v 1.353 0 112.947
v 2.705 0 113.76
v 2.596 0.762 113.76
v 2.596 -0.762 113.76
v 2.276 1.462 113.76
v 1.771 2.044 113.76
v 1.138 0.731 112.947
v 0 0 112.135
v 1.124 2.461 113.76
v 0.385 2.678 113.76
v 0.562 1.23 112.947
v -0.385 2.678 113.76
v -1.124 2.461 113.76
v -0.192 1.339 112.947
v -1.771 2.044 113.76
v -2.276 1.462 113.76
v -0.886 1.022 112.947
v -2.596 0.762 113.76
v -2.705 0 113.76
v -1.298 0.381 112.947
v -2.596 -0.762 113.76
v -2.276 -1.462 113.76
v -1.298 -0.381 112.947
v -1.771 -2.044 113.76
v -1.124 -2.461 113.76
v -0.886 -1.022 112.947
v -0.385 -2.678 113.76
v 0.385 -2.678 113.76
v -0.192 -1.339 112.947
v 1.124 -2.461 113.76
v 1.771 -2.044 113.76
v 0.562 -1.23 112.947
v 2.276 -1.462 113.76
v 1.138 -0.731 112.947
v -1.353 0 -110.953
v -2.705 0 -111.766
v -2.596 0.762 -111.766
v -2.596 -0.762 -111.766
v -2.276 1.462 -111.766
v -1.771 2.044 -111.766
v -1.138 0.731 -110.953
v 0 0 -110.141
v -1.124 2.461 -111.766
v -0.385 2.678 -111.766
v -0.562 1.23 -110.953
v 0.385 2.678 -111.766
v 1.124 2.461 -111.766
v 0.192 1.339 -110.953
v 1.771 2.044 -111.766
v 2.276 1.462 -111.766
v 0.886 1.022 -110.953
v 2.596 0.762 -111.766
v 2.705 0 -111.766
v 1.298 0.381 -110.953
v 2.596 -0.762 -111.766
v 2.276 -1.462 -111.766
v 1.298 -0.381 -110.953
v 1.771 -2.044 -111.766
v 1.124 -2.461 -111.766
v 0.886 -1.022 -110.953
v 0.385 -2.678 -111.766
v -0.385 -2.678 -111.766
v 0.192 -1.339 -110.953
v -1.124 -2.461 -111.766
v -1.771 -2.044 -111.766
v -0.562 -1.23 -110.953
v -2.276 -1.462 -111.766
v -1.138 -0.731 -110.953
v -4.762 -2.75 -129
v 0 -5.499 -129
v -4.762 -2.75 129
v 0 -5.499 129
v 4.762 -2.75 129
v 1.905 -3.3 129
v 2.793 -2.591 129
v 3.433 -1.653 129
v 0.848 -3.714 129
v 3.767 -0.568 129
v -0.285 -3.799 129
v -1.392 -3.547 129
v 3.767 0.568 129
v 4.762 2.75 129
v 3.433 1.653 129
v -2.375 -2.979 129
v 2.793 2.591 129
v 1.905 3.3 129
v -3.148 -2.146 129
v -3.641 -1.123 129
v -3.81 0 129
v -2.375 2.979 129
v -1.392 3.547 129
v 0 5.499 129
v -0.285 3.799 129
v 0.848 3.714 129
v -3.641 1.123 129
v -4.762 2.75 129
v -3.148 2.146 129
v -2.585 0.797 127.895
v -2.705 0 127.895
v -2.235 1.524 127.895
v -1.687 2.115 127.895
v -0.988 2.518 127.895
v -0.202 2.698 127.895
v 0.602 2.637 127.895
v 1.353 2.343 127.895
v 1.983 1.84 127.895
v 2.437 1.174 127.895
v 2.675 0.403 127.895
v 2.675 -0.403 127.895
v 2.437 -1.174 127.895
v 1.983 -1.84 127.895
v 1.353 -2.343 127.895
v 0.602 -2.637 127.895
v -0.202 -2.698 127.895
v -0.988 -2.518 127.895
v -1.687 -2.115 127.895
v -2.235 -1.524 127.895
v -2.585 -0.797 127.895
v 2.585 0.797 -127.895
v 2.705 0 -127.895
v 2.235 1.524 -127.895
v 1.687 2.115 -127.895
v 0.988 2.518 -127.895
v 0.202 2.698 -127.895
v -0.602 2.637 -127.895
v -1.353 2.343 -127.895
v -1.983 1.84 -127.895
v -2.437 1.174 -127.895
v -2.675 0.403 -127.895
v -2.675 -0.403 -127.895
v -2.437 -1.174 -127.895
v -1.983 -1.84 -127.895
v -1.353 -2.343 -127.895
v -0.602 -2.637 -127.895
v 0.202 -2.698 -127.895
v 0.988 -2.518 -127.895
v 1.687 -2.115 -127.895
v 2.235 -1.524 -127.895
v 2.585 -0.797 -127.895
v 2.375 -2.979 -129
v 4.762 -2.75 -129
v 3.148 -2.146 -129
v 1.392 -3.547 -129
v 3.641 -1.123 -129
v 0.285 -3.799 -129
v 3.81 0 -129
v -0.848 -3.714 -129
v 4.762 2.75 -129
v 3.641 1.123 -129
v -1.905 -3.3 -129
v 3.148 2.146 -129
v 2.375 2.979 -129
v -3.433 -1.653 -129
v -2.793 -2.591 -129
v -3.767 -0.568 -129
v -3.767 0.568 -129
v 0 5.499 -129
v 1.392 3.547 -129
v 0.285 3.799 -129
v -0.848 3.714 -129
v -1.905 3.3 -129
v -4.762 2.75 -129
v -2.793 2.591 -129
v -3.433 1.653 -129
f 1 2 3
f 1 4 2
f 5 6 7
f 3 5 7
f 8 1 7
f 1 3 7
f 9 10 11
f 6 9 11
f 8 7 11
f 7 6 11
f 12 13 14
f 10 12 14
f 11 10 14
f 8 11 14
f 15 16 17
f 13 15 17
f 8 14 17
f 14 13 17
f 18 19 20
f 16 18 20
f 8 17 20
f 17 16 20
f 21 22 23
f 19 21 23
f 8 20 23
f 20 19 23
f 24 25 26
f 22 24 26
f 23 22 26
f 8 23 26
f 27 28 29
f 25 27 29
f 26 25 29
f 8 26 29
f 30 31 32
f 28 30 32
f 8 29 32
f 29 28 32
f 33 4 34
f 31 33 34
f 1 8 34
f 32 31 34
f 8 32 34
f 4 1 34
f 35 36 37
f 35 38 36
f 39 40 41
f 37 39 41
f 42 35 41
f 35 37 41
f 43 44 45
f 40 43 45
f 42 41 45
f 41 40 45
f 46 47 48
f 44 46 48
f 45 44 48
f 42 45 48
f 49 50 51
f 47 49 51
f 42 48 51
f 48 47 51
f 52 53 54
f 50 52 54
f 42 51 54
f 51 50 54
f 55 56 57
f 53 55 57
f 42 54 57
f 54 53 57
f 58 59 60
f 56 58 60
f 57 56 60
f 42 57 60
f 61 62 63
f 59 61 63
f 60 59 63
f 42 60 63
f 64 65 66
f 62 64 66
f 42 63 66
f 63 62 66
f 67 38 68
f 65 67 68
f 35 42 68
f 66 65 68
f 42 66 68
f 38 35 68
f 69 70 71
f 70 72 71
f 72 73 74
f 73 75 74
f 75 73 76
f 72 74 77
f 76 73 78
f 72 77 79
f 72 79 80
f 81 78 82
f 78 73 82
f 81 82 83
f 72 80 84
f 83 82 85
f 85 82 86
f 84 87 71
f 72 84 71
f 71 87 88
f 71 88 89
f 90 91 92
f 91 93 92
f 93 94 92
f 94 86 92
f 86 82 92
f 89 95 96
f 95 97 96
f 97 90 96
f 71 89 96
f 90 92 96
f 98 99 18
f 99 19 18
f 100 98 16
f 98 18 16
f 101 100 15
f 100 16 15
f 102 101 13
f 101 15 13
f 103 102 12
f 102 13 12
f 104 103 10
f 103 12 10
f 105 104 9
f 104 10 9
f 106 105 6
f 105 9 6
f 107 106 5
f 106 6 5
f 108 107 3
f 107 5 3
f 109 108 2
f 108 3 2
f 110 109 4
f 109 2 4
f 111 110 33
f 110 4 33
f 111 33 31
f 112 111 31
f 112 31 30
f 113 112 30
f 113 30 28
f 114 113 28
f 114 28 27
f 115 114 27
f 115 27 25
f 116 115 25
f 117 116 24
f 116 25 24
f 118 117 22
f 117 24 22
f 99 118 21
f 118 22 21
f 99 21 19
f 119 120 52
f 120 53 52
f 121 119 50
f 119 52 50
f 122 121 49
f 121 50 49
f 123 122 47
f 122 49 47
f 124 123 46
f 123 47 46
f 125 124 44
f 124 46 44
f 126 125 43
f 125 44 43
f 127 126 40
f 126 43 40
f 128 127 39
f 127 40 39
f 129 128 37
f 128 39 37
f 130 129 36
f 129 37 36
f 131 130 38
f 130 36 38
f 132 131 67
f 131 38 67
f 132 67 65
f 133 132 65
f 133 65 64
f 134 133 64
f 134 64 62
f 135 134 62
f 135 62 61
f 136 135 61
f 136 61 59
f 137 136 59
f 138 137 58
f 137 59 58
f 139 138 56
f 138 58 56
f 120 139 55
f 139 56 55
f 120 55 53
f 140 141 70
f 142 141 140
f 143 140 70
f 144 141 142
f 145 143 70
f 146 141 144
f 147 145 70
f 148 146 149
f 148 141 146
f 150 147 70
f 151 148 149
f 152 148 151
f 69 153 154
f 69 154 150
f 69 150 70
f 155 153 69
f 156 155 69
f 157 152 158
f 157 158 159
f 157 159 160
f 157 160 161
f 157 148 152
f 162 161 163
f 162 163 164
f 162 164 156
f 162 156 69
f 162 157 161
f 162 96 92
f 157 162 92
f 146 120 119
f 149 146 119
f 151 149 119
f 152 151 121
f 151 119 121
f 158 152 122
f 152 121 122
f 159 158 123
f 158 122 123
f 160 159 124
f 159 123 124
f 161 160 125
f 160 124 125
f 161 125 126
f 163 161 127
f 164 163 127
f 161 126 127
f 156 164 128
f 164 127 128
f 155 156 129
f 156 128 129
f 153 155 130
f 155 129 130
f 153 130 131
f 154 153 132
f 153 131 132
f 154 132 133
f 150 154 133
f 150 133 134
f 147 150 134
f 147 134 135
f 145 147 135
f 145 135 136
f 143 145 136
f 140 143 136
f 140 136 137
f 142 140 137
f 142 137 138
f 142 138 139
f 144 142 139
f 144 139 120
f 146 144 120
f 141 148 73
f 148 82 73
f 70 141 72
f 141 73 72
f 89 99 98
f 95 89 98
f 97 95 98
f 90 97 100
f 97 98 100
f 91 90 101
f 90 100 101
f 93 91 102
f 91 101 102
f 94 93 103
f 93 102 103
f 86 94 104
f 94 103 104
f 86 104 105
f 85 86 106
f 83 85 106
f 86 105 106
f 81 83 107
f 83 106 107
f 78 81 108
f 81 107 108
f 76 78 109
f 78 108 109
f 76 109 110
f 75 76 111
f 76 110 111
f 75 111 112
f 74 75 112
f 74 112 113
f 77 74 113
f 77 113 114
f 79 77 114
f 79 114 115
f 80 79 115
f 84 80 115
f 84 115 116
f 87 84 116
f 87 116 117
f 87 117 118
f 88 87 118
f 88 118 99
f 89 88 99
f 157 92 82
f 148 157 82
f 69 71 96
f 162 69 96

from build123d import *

# Parameters (mm, degrees)
BOSS_EXTRUDE1_DEPTH               = 129
F_1_4_28_TAPPED_HOLE1_D           = 5.4102
F_1_4_28_TAPPED_HOLE1_DEPTH       = 15.24
F_1_4_28_TAPPED_HOLE1_CSINK_D     = 7.62
F_1_4_28_TAPPED_HOLE1_CSINK_ANGLE = 90
F_1_4_28_TAPPED_HOLE1_TIP         = 1.625388061
F_1_4_28_TAPPED_HOLE2_D           = 5.4102
F_1_4_28_TAPPED_HOLE2_DEPTH       = 17.2339
F_1_4_28_TAPPED_HOLE2_CSINK_D     = 7.62
F_1_4_28_TAPPED_HOLE2_CSINK_ANGLE = 90
F_1_4_28_TAPPED_HOLE2_TIP         = 1.625388061


with BuildPart() as part:
    # Sketch3 → Boss-Extrude1 (new, symmetric)
    with BuildSketch(Plane.XY):
        Polygon((0, 5.499261314), (4.7625, 2.749630657), (4.7625, -2.749630657), (0, -5.499261314), (-4.7625, -2.749630657), (-4.7625, 2.749630657), align=None)
    extrude(amount=BOSS_EXTRUDE1_DEPTH, both=True)

    # 1/4-28 Tapped Hole1
    with Locations(Plane.XY.offset(129)):
        with Locations((0, 0)):
            CounterSinkHole(F_1_4_28_TAPPED_HOLE1_D / 2, F_1_4_28_TAPPED_HOLE1_CSINK_D / 2, depth=F_1_4_28_TAPPED_HOLE1_DEPTH, counter_sink_angle=F_1_4_28_TAPPED_HOLE1_CSINK_ANGLE)
            with Locations((0, 0, -(F_1_4_28_TAPPED_HOLE1_DEPTH + F_1_4_28_TAPPED_HOLE1_TIP / 2))):  # 118° drill point
                Cone(0, F_1_4_28_TAPPED_HOLE1_D / 2, F_1_4_28_TAPPED_HOLE1_TIP, mode=Mode.SUBTRACT)

    # 1/4-28 Tapped Hole2
    with Locations(Plane(origin=(0, 0, -129), x_dir=(-1, 0, 0), z_dir=(0, 0, -1))):
        with Locations((0, 0)):
            CounterSinkHole(F_1_4_28_TAPPED_HOLE2_D / 2, F_1_4_28_TAPPED_HOLE2_CSINK_D / 2, depth=F_1_4_28_TAPPED_HOLE2_DEPTH, counter_sink_angle=F_1_4_28_TAPPED_HOLE2_CSINK_ANGLE)
            with Locations((0, 0, -(F_1_4_28_TAPPED_HOLE2_DEPTH + F_1_4_28_TAPPED_HOLE2_TIP / 2))):  # 118° drill point
                Cone(0, F_1_4_28_TAPPED_HOLE2_D / 2, F_1_4_28_TAPPED_HOLE2_TIP, mode=Mode.SUBTRACT)


solid = part.part
